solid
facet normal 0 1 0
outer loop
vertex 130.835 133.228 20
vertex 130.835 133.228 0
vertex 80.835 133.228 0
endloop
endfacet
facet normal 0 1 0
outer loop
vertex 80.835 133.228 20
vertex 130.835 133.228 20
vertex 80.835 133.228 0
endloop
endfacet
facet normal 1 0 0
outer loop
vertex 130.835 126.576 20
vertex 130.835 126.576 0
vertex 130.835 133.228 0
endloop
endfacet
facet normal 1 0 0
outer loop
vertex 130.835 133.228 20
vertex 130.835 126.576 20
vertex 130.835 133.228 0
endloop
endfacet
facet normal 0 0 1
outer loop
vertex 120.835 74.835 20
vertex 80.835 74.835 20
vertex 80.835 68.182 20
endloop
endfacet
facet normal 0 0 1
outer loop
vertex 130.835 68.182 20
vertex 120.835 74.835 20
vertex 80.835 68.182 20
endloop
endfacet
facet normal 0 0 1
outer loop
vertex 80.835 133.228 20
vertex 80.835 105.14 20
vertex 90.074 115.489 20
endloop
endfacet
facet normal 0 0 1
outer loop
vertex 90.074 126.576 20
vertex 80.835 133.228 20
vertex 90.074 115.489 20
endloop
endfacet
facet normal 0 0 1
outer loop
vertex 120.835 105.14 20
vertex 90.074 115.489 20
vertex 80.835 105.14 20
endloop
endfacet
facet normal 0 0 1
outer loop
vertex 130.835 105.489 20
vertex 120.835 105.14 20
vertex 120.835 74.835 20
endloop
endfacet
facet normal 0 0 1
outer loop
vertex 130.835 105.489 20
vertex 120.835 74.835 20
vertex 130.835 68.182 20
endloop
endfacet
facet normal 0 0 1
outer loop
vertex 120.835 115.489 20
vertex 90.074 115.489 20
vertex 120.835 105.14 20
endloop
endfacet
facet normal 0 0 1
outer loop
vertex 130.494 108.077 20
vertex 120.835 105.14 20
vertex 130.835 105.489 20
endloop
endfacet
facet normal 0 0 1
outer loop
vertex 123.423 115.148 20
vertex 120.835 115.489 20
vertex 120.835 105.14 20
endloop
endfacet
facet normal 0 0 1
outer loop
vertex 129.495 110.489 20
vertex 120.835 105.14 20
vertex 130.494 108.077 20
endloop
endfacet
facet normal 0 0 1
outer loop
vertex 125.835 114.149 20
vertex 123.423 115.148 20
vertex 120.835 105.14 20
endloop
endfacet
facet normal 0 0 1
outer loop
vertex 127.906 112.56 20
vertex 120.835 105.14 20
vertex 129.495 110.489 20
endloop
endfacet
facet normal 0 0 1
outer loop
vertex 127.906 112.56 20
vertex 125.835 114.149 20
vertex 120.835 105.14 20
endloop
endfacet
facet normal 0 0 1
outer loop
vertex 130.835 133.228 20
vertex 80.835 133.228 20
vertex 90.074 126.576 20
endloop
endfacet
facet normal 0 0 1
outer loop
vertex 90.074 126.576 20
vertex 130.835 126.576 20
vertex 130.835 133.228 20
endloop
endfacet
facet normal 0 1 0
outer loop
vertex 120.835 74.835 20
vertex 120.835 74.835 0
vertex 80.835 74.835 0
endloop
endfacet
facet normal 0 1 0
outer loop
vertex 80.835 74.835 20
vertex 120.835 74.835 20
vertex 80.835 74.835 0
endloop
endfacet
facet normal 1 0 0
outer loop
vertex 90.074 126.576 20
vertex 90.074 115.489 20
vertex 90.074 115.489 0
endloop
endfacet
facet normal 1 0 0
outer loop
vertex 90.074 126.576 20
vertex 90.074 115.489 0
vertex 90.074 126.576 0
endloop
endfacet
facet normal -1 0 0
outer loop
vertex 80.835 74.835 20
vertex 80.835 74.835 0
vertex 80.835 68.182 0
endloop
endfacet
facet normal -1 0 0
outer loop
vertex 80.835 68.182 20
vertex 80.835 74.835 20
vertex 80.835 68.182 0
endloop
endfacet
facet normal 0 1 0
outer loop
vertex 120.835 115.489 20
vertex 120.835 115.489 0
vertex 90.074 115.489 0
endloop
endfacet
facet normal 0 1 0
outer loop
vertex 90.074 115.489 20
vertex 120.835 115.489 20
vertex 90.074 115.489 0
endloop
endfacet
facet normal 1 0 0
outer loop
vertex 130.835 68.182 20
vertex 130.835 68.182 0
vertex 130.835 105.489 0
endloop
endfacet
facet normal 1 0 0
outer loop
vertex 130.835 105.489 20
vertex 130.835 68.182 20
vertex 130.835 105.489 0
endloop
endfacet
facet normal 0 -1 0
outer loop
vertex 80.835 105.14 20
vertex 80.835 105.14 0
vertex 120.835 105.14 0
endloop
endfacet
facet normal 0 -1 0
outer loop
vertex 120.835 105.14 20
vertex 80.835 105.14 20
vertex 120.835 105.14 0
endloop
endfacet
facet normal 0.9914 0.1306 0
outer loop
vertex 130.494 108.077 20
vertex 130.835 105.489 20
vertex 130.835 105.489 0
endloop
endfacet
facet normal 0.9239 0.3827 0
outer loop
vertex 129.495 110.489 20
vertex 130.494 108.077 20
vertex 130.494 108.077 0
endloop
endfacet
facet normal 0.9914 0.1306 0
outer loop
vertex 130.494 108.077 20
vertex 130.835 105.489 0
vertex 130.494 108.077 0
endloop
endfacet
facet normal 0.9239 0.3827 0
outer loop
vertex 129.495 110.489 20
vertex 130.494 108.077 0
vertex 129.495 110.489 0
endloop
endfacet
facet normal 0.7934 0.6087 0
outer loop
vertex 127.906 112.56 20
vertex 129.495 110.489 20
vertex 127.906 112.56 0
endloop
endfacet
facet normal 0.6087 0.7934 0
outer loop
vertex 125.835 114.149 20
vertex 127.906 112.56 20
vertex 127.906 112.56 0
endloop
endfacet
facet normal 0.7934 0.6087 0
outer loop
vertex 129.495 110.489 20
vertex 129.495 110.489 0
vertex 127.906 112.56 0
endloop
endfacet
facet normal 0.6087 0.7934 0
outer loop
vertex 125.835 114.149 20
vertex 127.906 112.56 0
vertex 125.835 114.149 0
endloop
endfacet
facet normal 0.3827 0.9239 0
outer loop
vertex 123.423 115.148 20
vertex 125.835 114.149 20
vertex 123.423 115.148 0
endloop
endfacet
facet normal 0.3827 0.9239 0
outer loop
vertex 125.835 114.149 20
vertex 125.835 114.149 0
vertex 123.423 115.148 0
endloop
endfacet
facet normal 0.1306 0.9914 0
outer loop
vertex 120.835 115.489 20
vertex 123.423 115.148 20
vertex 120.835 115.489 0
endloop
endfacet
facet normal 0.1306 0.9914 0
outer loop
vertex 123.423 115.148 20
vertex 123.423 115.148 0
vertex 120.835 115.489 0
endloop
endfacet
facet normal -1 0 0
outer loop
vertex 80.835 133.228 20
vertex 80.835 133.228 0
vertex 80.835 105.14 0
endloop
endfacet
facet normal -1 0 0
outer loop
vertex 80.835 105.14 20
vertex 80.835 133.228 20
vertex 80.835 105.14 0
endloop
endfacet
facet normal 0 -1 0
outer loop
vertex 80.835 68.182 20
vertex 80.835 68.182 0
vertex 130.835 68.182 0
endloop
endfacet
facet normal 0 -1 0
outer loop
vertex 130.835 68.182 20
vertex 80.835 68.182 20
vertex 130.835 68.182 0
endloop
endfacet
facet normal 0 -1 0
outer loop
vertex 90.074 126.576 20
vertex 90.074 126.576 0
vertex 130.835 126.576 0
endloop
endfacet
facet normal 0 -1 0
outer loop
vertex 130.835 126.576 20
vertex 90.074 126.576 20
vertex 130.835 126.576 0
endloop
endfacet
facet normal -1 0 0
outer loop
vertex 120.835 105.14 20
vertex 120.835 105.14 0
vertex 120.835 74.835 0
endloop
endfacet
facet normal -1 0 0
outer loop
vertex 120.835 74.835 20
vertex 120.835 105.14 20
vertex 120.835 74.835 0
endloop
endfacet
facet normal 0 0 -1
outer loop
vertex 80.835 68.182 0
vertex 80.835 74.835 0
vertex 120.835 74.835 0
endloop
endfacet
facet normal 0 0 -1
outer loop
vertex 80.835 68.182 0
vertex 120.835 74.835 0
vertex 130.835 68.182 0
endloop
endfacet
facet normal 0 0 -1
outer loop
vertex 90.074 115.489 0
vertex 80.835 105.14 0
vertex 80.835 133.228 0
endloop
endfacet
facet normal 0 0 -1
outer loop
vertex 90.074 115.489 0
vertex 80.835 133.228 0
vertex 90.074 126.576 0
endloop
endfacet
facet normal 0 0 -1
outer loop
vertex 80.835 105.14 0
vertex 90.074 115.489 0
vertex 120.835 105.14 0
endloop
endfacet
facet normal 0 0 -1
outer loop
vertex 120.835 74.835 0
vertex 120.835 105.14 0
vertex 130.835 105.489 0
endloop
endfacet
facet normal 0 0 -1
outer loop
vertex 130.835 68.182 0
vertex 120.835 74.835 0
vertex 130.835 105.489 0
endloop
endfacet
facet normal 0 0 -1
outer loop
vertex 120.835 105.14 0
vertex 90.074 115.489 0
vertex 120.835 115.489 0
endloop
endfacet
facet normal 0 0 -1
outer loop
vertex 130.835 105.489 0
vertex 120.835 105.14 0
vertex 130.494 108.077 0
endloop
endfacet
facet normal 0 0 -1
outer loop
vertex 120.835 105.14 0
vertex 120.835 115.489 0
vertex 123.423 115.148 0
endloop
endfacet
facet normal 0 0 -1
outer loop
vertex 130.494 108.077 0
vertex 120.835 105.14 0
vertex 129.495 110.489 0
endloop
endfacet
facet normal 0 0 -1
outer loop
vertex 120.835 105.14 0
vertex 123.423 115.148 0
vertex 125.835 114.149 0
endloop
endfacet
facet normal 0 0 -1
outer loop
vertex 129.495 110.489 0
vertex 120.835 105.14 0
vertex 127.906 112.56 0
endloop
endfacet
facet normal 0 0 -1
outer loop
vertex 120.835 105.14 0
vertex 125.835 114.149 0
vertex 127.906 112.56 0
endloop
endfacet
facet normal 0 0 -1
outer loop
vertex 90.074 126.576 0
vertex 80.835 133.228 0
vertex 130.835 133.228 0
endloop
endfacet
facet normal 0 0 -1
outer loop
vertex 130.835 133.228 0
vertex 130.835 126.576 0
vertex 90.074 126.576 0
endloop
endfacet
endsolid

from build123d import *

# Parameters (mm, degrees)
BOSS_EXTRUDE1_DEPTH = 20


with BuildPart() as part:
    # Sketch1 → Boss-Extrude1 (new body)
    with BuildSketch(Plane.XY):
        with BuildLine():
            Line((130.834806192, 133.228481614), (80.834806192, 133.228481614))
            Line((80.834806192, 133.228481614), (80.834806192, 105.140286594))
            Line((80.834806192, 105.140286594), (120.834806192, 105.140286594))
            Line((120.834806192, 105.140286594), (120.834806192, 74.834602493))
            Line((120.834806192, 74.834602493), (80.834806192, 74.834602493))
            Line((80.834806192, 74.834602493), (80.834806192, 68.182135251))
            Line((80.834806192, 68.182135251), (130.834806192, 68.182135251))
            Line((130.834806192, 68.182135251), (130.834806192, 105.488568969))
            ThreePointArc((130.834806192, 105.488568969), (127.905874004, 112.559636781), (120.834806192, 115.488568969))
            Line((120.834806192, 115.488568969), (90.074344028, 115.488568969))
            Line((90.074344028, 115.488568969), (90.074344028, 126.576014372))
            Line((90.074344028, 126.576014372), (130.834806192, 126.576014372))
            Line((130.834806192, 126.576014372), (130.834806192, 133.228481614))
        make_face()
    extrude(amount=BOSS_EXTRUDE1_DEPTH)


solid = part.part
